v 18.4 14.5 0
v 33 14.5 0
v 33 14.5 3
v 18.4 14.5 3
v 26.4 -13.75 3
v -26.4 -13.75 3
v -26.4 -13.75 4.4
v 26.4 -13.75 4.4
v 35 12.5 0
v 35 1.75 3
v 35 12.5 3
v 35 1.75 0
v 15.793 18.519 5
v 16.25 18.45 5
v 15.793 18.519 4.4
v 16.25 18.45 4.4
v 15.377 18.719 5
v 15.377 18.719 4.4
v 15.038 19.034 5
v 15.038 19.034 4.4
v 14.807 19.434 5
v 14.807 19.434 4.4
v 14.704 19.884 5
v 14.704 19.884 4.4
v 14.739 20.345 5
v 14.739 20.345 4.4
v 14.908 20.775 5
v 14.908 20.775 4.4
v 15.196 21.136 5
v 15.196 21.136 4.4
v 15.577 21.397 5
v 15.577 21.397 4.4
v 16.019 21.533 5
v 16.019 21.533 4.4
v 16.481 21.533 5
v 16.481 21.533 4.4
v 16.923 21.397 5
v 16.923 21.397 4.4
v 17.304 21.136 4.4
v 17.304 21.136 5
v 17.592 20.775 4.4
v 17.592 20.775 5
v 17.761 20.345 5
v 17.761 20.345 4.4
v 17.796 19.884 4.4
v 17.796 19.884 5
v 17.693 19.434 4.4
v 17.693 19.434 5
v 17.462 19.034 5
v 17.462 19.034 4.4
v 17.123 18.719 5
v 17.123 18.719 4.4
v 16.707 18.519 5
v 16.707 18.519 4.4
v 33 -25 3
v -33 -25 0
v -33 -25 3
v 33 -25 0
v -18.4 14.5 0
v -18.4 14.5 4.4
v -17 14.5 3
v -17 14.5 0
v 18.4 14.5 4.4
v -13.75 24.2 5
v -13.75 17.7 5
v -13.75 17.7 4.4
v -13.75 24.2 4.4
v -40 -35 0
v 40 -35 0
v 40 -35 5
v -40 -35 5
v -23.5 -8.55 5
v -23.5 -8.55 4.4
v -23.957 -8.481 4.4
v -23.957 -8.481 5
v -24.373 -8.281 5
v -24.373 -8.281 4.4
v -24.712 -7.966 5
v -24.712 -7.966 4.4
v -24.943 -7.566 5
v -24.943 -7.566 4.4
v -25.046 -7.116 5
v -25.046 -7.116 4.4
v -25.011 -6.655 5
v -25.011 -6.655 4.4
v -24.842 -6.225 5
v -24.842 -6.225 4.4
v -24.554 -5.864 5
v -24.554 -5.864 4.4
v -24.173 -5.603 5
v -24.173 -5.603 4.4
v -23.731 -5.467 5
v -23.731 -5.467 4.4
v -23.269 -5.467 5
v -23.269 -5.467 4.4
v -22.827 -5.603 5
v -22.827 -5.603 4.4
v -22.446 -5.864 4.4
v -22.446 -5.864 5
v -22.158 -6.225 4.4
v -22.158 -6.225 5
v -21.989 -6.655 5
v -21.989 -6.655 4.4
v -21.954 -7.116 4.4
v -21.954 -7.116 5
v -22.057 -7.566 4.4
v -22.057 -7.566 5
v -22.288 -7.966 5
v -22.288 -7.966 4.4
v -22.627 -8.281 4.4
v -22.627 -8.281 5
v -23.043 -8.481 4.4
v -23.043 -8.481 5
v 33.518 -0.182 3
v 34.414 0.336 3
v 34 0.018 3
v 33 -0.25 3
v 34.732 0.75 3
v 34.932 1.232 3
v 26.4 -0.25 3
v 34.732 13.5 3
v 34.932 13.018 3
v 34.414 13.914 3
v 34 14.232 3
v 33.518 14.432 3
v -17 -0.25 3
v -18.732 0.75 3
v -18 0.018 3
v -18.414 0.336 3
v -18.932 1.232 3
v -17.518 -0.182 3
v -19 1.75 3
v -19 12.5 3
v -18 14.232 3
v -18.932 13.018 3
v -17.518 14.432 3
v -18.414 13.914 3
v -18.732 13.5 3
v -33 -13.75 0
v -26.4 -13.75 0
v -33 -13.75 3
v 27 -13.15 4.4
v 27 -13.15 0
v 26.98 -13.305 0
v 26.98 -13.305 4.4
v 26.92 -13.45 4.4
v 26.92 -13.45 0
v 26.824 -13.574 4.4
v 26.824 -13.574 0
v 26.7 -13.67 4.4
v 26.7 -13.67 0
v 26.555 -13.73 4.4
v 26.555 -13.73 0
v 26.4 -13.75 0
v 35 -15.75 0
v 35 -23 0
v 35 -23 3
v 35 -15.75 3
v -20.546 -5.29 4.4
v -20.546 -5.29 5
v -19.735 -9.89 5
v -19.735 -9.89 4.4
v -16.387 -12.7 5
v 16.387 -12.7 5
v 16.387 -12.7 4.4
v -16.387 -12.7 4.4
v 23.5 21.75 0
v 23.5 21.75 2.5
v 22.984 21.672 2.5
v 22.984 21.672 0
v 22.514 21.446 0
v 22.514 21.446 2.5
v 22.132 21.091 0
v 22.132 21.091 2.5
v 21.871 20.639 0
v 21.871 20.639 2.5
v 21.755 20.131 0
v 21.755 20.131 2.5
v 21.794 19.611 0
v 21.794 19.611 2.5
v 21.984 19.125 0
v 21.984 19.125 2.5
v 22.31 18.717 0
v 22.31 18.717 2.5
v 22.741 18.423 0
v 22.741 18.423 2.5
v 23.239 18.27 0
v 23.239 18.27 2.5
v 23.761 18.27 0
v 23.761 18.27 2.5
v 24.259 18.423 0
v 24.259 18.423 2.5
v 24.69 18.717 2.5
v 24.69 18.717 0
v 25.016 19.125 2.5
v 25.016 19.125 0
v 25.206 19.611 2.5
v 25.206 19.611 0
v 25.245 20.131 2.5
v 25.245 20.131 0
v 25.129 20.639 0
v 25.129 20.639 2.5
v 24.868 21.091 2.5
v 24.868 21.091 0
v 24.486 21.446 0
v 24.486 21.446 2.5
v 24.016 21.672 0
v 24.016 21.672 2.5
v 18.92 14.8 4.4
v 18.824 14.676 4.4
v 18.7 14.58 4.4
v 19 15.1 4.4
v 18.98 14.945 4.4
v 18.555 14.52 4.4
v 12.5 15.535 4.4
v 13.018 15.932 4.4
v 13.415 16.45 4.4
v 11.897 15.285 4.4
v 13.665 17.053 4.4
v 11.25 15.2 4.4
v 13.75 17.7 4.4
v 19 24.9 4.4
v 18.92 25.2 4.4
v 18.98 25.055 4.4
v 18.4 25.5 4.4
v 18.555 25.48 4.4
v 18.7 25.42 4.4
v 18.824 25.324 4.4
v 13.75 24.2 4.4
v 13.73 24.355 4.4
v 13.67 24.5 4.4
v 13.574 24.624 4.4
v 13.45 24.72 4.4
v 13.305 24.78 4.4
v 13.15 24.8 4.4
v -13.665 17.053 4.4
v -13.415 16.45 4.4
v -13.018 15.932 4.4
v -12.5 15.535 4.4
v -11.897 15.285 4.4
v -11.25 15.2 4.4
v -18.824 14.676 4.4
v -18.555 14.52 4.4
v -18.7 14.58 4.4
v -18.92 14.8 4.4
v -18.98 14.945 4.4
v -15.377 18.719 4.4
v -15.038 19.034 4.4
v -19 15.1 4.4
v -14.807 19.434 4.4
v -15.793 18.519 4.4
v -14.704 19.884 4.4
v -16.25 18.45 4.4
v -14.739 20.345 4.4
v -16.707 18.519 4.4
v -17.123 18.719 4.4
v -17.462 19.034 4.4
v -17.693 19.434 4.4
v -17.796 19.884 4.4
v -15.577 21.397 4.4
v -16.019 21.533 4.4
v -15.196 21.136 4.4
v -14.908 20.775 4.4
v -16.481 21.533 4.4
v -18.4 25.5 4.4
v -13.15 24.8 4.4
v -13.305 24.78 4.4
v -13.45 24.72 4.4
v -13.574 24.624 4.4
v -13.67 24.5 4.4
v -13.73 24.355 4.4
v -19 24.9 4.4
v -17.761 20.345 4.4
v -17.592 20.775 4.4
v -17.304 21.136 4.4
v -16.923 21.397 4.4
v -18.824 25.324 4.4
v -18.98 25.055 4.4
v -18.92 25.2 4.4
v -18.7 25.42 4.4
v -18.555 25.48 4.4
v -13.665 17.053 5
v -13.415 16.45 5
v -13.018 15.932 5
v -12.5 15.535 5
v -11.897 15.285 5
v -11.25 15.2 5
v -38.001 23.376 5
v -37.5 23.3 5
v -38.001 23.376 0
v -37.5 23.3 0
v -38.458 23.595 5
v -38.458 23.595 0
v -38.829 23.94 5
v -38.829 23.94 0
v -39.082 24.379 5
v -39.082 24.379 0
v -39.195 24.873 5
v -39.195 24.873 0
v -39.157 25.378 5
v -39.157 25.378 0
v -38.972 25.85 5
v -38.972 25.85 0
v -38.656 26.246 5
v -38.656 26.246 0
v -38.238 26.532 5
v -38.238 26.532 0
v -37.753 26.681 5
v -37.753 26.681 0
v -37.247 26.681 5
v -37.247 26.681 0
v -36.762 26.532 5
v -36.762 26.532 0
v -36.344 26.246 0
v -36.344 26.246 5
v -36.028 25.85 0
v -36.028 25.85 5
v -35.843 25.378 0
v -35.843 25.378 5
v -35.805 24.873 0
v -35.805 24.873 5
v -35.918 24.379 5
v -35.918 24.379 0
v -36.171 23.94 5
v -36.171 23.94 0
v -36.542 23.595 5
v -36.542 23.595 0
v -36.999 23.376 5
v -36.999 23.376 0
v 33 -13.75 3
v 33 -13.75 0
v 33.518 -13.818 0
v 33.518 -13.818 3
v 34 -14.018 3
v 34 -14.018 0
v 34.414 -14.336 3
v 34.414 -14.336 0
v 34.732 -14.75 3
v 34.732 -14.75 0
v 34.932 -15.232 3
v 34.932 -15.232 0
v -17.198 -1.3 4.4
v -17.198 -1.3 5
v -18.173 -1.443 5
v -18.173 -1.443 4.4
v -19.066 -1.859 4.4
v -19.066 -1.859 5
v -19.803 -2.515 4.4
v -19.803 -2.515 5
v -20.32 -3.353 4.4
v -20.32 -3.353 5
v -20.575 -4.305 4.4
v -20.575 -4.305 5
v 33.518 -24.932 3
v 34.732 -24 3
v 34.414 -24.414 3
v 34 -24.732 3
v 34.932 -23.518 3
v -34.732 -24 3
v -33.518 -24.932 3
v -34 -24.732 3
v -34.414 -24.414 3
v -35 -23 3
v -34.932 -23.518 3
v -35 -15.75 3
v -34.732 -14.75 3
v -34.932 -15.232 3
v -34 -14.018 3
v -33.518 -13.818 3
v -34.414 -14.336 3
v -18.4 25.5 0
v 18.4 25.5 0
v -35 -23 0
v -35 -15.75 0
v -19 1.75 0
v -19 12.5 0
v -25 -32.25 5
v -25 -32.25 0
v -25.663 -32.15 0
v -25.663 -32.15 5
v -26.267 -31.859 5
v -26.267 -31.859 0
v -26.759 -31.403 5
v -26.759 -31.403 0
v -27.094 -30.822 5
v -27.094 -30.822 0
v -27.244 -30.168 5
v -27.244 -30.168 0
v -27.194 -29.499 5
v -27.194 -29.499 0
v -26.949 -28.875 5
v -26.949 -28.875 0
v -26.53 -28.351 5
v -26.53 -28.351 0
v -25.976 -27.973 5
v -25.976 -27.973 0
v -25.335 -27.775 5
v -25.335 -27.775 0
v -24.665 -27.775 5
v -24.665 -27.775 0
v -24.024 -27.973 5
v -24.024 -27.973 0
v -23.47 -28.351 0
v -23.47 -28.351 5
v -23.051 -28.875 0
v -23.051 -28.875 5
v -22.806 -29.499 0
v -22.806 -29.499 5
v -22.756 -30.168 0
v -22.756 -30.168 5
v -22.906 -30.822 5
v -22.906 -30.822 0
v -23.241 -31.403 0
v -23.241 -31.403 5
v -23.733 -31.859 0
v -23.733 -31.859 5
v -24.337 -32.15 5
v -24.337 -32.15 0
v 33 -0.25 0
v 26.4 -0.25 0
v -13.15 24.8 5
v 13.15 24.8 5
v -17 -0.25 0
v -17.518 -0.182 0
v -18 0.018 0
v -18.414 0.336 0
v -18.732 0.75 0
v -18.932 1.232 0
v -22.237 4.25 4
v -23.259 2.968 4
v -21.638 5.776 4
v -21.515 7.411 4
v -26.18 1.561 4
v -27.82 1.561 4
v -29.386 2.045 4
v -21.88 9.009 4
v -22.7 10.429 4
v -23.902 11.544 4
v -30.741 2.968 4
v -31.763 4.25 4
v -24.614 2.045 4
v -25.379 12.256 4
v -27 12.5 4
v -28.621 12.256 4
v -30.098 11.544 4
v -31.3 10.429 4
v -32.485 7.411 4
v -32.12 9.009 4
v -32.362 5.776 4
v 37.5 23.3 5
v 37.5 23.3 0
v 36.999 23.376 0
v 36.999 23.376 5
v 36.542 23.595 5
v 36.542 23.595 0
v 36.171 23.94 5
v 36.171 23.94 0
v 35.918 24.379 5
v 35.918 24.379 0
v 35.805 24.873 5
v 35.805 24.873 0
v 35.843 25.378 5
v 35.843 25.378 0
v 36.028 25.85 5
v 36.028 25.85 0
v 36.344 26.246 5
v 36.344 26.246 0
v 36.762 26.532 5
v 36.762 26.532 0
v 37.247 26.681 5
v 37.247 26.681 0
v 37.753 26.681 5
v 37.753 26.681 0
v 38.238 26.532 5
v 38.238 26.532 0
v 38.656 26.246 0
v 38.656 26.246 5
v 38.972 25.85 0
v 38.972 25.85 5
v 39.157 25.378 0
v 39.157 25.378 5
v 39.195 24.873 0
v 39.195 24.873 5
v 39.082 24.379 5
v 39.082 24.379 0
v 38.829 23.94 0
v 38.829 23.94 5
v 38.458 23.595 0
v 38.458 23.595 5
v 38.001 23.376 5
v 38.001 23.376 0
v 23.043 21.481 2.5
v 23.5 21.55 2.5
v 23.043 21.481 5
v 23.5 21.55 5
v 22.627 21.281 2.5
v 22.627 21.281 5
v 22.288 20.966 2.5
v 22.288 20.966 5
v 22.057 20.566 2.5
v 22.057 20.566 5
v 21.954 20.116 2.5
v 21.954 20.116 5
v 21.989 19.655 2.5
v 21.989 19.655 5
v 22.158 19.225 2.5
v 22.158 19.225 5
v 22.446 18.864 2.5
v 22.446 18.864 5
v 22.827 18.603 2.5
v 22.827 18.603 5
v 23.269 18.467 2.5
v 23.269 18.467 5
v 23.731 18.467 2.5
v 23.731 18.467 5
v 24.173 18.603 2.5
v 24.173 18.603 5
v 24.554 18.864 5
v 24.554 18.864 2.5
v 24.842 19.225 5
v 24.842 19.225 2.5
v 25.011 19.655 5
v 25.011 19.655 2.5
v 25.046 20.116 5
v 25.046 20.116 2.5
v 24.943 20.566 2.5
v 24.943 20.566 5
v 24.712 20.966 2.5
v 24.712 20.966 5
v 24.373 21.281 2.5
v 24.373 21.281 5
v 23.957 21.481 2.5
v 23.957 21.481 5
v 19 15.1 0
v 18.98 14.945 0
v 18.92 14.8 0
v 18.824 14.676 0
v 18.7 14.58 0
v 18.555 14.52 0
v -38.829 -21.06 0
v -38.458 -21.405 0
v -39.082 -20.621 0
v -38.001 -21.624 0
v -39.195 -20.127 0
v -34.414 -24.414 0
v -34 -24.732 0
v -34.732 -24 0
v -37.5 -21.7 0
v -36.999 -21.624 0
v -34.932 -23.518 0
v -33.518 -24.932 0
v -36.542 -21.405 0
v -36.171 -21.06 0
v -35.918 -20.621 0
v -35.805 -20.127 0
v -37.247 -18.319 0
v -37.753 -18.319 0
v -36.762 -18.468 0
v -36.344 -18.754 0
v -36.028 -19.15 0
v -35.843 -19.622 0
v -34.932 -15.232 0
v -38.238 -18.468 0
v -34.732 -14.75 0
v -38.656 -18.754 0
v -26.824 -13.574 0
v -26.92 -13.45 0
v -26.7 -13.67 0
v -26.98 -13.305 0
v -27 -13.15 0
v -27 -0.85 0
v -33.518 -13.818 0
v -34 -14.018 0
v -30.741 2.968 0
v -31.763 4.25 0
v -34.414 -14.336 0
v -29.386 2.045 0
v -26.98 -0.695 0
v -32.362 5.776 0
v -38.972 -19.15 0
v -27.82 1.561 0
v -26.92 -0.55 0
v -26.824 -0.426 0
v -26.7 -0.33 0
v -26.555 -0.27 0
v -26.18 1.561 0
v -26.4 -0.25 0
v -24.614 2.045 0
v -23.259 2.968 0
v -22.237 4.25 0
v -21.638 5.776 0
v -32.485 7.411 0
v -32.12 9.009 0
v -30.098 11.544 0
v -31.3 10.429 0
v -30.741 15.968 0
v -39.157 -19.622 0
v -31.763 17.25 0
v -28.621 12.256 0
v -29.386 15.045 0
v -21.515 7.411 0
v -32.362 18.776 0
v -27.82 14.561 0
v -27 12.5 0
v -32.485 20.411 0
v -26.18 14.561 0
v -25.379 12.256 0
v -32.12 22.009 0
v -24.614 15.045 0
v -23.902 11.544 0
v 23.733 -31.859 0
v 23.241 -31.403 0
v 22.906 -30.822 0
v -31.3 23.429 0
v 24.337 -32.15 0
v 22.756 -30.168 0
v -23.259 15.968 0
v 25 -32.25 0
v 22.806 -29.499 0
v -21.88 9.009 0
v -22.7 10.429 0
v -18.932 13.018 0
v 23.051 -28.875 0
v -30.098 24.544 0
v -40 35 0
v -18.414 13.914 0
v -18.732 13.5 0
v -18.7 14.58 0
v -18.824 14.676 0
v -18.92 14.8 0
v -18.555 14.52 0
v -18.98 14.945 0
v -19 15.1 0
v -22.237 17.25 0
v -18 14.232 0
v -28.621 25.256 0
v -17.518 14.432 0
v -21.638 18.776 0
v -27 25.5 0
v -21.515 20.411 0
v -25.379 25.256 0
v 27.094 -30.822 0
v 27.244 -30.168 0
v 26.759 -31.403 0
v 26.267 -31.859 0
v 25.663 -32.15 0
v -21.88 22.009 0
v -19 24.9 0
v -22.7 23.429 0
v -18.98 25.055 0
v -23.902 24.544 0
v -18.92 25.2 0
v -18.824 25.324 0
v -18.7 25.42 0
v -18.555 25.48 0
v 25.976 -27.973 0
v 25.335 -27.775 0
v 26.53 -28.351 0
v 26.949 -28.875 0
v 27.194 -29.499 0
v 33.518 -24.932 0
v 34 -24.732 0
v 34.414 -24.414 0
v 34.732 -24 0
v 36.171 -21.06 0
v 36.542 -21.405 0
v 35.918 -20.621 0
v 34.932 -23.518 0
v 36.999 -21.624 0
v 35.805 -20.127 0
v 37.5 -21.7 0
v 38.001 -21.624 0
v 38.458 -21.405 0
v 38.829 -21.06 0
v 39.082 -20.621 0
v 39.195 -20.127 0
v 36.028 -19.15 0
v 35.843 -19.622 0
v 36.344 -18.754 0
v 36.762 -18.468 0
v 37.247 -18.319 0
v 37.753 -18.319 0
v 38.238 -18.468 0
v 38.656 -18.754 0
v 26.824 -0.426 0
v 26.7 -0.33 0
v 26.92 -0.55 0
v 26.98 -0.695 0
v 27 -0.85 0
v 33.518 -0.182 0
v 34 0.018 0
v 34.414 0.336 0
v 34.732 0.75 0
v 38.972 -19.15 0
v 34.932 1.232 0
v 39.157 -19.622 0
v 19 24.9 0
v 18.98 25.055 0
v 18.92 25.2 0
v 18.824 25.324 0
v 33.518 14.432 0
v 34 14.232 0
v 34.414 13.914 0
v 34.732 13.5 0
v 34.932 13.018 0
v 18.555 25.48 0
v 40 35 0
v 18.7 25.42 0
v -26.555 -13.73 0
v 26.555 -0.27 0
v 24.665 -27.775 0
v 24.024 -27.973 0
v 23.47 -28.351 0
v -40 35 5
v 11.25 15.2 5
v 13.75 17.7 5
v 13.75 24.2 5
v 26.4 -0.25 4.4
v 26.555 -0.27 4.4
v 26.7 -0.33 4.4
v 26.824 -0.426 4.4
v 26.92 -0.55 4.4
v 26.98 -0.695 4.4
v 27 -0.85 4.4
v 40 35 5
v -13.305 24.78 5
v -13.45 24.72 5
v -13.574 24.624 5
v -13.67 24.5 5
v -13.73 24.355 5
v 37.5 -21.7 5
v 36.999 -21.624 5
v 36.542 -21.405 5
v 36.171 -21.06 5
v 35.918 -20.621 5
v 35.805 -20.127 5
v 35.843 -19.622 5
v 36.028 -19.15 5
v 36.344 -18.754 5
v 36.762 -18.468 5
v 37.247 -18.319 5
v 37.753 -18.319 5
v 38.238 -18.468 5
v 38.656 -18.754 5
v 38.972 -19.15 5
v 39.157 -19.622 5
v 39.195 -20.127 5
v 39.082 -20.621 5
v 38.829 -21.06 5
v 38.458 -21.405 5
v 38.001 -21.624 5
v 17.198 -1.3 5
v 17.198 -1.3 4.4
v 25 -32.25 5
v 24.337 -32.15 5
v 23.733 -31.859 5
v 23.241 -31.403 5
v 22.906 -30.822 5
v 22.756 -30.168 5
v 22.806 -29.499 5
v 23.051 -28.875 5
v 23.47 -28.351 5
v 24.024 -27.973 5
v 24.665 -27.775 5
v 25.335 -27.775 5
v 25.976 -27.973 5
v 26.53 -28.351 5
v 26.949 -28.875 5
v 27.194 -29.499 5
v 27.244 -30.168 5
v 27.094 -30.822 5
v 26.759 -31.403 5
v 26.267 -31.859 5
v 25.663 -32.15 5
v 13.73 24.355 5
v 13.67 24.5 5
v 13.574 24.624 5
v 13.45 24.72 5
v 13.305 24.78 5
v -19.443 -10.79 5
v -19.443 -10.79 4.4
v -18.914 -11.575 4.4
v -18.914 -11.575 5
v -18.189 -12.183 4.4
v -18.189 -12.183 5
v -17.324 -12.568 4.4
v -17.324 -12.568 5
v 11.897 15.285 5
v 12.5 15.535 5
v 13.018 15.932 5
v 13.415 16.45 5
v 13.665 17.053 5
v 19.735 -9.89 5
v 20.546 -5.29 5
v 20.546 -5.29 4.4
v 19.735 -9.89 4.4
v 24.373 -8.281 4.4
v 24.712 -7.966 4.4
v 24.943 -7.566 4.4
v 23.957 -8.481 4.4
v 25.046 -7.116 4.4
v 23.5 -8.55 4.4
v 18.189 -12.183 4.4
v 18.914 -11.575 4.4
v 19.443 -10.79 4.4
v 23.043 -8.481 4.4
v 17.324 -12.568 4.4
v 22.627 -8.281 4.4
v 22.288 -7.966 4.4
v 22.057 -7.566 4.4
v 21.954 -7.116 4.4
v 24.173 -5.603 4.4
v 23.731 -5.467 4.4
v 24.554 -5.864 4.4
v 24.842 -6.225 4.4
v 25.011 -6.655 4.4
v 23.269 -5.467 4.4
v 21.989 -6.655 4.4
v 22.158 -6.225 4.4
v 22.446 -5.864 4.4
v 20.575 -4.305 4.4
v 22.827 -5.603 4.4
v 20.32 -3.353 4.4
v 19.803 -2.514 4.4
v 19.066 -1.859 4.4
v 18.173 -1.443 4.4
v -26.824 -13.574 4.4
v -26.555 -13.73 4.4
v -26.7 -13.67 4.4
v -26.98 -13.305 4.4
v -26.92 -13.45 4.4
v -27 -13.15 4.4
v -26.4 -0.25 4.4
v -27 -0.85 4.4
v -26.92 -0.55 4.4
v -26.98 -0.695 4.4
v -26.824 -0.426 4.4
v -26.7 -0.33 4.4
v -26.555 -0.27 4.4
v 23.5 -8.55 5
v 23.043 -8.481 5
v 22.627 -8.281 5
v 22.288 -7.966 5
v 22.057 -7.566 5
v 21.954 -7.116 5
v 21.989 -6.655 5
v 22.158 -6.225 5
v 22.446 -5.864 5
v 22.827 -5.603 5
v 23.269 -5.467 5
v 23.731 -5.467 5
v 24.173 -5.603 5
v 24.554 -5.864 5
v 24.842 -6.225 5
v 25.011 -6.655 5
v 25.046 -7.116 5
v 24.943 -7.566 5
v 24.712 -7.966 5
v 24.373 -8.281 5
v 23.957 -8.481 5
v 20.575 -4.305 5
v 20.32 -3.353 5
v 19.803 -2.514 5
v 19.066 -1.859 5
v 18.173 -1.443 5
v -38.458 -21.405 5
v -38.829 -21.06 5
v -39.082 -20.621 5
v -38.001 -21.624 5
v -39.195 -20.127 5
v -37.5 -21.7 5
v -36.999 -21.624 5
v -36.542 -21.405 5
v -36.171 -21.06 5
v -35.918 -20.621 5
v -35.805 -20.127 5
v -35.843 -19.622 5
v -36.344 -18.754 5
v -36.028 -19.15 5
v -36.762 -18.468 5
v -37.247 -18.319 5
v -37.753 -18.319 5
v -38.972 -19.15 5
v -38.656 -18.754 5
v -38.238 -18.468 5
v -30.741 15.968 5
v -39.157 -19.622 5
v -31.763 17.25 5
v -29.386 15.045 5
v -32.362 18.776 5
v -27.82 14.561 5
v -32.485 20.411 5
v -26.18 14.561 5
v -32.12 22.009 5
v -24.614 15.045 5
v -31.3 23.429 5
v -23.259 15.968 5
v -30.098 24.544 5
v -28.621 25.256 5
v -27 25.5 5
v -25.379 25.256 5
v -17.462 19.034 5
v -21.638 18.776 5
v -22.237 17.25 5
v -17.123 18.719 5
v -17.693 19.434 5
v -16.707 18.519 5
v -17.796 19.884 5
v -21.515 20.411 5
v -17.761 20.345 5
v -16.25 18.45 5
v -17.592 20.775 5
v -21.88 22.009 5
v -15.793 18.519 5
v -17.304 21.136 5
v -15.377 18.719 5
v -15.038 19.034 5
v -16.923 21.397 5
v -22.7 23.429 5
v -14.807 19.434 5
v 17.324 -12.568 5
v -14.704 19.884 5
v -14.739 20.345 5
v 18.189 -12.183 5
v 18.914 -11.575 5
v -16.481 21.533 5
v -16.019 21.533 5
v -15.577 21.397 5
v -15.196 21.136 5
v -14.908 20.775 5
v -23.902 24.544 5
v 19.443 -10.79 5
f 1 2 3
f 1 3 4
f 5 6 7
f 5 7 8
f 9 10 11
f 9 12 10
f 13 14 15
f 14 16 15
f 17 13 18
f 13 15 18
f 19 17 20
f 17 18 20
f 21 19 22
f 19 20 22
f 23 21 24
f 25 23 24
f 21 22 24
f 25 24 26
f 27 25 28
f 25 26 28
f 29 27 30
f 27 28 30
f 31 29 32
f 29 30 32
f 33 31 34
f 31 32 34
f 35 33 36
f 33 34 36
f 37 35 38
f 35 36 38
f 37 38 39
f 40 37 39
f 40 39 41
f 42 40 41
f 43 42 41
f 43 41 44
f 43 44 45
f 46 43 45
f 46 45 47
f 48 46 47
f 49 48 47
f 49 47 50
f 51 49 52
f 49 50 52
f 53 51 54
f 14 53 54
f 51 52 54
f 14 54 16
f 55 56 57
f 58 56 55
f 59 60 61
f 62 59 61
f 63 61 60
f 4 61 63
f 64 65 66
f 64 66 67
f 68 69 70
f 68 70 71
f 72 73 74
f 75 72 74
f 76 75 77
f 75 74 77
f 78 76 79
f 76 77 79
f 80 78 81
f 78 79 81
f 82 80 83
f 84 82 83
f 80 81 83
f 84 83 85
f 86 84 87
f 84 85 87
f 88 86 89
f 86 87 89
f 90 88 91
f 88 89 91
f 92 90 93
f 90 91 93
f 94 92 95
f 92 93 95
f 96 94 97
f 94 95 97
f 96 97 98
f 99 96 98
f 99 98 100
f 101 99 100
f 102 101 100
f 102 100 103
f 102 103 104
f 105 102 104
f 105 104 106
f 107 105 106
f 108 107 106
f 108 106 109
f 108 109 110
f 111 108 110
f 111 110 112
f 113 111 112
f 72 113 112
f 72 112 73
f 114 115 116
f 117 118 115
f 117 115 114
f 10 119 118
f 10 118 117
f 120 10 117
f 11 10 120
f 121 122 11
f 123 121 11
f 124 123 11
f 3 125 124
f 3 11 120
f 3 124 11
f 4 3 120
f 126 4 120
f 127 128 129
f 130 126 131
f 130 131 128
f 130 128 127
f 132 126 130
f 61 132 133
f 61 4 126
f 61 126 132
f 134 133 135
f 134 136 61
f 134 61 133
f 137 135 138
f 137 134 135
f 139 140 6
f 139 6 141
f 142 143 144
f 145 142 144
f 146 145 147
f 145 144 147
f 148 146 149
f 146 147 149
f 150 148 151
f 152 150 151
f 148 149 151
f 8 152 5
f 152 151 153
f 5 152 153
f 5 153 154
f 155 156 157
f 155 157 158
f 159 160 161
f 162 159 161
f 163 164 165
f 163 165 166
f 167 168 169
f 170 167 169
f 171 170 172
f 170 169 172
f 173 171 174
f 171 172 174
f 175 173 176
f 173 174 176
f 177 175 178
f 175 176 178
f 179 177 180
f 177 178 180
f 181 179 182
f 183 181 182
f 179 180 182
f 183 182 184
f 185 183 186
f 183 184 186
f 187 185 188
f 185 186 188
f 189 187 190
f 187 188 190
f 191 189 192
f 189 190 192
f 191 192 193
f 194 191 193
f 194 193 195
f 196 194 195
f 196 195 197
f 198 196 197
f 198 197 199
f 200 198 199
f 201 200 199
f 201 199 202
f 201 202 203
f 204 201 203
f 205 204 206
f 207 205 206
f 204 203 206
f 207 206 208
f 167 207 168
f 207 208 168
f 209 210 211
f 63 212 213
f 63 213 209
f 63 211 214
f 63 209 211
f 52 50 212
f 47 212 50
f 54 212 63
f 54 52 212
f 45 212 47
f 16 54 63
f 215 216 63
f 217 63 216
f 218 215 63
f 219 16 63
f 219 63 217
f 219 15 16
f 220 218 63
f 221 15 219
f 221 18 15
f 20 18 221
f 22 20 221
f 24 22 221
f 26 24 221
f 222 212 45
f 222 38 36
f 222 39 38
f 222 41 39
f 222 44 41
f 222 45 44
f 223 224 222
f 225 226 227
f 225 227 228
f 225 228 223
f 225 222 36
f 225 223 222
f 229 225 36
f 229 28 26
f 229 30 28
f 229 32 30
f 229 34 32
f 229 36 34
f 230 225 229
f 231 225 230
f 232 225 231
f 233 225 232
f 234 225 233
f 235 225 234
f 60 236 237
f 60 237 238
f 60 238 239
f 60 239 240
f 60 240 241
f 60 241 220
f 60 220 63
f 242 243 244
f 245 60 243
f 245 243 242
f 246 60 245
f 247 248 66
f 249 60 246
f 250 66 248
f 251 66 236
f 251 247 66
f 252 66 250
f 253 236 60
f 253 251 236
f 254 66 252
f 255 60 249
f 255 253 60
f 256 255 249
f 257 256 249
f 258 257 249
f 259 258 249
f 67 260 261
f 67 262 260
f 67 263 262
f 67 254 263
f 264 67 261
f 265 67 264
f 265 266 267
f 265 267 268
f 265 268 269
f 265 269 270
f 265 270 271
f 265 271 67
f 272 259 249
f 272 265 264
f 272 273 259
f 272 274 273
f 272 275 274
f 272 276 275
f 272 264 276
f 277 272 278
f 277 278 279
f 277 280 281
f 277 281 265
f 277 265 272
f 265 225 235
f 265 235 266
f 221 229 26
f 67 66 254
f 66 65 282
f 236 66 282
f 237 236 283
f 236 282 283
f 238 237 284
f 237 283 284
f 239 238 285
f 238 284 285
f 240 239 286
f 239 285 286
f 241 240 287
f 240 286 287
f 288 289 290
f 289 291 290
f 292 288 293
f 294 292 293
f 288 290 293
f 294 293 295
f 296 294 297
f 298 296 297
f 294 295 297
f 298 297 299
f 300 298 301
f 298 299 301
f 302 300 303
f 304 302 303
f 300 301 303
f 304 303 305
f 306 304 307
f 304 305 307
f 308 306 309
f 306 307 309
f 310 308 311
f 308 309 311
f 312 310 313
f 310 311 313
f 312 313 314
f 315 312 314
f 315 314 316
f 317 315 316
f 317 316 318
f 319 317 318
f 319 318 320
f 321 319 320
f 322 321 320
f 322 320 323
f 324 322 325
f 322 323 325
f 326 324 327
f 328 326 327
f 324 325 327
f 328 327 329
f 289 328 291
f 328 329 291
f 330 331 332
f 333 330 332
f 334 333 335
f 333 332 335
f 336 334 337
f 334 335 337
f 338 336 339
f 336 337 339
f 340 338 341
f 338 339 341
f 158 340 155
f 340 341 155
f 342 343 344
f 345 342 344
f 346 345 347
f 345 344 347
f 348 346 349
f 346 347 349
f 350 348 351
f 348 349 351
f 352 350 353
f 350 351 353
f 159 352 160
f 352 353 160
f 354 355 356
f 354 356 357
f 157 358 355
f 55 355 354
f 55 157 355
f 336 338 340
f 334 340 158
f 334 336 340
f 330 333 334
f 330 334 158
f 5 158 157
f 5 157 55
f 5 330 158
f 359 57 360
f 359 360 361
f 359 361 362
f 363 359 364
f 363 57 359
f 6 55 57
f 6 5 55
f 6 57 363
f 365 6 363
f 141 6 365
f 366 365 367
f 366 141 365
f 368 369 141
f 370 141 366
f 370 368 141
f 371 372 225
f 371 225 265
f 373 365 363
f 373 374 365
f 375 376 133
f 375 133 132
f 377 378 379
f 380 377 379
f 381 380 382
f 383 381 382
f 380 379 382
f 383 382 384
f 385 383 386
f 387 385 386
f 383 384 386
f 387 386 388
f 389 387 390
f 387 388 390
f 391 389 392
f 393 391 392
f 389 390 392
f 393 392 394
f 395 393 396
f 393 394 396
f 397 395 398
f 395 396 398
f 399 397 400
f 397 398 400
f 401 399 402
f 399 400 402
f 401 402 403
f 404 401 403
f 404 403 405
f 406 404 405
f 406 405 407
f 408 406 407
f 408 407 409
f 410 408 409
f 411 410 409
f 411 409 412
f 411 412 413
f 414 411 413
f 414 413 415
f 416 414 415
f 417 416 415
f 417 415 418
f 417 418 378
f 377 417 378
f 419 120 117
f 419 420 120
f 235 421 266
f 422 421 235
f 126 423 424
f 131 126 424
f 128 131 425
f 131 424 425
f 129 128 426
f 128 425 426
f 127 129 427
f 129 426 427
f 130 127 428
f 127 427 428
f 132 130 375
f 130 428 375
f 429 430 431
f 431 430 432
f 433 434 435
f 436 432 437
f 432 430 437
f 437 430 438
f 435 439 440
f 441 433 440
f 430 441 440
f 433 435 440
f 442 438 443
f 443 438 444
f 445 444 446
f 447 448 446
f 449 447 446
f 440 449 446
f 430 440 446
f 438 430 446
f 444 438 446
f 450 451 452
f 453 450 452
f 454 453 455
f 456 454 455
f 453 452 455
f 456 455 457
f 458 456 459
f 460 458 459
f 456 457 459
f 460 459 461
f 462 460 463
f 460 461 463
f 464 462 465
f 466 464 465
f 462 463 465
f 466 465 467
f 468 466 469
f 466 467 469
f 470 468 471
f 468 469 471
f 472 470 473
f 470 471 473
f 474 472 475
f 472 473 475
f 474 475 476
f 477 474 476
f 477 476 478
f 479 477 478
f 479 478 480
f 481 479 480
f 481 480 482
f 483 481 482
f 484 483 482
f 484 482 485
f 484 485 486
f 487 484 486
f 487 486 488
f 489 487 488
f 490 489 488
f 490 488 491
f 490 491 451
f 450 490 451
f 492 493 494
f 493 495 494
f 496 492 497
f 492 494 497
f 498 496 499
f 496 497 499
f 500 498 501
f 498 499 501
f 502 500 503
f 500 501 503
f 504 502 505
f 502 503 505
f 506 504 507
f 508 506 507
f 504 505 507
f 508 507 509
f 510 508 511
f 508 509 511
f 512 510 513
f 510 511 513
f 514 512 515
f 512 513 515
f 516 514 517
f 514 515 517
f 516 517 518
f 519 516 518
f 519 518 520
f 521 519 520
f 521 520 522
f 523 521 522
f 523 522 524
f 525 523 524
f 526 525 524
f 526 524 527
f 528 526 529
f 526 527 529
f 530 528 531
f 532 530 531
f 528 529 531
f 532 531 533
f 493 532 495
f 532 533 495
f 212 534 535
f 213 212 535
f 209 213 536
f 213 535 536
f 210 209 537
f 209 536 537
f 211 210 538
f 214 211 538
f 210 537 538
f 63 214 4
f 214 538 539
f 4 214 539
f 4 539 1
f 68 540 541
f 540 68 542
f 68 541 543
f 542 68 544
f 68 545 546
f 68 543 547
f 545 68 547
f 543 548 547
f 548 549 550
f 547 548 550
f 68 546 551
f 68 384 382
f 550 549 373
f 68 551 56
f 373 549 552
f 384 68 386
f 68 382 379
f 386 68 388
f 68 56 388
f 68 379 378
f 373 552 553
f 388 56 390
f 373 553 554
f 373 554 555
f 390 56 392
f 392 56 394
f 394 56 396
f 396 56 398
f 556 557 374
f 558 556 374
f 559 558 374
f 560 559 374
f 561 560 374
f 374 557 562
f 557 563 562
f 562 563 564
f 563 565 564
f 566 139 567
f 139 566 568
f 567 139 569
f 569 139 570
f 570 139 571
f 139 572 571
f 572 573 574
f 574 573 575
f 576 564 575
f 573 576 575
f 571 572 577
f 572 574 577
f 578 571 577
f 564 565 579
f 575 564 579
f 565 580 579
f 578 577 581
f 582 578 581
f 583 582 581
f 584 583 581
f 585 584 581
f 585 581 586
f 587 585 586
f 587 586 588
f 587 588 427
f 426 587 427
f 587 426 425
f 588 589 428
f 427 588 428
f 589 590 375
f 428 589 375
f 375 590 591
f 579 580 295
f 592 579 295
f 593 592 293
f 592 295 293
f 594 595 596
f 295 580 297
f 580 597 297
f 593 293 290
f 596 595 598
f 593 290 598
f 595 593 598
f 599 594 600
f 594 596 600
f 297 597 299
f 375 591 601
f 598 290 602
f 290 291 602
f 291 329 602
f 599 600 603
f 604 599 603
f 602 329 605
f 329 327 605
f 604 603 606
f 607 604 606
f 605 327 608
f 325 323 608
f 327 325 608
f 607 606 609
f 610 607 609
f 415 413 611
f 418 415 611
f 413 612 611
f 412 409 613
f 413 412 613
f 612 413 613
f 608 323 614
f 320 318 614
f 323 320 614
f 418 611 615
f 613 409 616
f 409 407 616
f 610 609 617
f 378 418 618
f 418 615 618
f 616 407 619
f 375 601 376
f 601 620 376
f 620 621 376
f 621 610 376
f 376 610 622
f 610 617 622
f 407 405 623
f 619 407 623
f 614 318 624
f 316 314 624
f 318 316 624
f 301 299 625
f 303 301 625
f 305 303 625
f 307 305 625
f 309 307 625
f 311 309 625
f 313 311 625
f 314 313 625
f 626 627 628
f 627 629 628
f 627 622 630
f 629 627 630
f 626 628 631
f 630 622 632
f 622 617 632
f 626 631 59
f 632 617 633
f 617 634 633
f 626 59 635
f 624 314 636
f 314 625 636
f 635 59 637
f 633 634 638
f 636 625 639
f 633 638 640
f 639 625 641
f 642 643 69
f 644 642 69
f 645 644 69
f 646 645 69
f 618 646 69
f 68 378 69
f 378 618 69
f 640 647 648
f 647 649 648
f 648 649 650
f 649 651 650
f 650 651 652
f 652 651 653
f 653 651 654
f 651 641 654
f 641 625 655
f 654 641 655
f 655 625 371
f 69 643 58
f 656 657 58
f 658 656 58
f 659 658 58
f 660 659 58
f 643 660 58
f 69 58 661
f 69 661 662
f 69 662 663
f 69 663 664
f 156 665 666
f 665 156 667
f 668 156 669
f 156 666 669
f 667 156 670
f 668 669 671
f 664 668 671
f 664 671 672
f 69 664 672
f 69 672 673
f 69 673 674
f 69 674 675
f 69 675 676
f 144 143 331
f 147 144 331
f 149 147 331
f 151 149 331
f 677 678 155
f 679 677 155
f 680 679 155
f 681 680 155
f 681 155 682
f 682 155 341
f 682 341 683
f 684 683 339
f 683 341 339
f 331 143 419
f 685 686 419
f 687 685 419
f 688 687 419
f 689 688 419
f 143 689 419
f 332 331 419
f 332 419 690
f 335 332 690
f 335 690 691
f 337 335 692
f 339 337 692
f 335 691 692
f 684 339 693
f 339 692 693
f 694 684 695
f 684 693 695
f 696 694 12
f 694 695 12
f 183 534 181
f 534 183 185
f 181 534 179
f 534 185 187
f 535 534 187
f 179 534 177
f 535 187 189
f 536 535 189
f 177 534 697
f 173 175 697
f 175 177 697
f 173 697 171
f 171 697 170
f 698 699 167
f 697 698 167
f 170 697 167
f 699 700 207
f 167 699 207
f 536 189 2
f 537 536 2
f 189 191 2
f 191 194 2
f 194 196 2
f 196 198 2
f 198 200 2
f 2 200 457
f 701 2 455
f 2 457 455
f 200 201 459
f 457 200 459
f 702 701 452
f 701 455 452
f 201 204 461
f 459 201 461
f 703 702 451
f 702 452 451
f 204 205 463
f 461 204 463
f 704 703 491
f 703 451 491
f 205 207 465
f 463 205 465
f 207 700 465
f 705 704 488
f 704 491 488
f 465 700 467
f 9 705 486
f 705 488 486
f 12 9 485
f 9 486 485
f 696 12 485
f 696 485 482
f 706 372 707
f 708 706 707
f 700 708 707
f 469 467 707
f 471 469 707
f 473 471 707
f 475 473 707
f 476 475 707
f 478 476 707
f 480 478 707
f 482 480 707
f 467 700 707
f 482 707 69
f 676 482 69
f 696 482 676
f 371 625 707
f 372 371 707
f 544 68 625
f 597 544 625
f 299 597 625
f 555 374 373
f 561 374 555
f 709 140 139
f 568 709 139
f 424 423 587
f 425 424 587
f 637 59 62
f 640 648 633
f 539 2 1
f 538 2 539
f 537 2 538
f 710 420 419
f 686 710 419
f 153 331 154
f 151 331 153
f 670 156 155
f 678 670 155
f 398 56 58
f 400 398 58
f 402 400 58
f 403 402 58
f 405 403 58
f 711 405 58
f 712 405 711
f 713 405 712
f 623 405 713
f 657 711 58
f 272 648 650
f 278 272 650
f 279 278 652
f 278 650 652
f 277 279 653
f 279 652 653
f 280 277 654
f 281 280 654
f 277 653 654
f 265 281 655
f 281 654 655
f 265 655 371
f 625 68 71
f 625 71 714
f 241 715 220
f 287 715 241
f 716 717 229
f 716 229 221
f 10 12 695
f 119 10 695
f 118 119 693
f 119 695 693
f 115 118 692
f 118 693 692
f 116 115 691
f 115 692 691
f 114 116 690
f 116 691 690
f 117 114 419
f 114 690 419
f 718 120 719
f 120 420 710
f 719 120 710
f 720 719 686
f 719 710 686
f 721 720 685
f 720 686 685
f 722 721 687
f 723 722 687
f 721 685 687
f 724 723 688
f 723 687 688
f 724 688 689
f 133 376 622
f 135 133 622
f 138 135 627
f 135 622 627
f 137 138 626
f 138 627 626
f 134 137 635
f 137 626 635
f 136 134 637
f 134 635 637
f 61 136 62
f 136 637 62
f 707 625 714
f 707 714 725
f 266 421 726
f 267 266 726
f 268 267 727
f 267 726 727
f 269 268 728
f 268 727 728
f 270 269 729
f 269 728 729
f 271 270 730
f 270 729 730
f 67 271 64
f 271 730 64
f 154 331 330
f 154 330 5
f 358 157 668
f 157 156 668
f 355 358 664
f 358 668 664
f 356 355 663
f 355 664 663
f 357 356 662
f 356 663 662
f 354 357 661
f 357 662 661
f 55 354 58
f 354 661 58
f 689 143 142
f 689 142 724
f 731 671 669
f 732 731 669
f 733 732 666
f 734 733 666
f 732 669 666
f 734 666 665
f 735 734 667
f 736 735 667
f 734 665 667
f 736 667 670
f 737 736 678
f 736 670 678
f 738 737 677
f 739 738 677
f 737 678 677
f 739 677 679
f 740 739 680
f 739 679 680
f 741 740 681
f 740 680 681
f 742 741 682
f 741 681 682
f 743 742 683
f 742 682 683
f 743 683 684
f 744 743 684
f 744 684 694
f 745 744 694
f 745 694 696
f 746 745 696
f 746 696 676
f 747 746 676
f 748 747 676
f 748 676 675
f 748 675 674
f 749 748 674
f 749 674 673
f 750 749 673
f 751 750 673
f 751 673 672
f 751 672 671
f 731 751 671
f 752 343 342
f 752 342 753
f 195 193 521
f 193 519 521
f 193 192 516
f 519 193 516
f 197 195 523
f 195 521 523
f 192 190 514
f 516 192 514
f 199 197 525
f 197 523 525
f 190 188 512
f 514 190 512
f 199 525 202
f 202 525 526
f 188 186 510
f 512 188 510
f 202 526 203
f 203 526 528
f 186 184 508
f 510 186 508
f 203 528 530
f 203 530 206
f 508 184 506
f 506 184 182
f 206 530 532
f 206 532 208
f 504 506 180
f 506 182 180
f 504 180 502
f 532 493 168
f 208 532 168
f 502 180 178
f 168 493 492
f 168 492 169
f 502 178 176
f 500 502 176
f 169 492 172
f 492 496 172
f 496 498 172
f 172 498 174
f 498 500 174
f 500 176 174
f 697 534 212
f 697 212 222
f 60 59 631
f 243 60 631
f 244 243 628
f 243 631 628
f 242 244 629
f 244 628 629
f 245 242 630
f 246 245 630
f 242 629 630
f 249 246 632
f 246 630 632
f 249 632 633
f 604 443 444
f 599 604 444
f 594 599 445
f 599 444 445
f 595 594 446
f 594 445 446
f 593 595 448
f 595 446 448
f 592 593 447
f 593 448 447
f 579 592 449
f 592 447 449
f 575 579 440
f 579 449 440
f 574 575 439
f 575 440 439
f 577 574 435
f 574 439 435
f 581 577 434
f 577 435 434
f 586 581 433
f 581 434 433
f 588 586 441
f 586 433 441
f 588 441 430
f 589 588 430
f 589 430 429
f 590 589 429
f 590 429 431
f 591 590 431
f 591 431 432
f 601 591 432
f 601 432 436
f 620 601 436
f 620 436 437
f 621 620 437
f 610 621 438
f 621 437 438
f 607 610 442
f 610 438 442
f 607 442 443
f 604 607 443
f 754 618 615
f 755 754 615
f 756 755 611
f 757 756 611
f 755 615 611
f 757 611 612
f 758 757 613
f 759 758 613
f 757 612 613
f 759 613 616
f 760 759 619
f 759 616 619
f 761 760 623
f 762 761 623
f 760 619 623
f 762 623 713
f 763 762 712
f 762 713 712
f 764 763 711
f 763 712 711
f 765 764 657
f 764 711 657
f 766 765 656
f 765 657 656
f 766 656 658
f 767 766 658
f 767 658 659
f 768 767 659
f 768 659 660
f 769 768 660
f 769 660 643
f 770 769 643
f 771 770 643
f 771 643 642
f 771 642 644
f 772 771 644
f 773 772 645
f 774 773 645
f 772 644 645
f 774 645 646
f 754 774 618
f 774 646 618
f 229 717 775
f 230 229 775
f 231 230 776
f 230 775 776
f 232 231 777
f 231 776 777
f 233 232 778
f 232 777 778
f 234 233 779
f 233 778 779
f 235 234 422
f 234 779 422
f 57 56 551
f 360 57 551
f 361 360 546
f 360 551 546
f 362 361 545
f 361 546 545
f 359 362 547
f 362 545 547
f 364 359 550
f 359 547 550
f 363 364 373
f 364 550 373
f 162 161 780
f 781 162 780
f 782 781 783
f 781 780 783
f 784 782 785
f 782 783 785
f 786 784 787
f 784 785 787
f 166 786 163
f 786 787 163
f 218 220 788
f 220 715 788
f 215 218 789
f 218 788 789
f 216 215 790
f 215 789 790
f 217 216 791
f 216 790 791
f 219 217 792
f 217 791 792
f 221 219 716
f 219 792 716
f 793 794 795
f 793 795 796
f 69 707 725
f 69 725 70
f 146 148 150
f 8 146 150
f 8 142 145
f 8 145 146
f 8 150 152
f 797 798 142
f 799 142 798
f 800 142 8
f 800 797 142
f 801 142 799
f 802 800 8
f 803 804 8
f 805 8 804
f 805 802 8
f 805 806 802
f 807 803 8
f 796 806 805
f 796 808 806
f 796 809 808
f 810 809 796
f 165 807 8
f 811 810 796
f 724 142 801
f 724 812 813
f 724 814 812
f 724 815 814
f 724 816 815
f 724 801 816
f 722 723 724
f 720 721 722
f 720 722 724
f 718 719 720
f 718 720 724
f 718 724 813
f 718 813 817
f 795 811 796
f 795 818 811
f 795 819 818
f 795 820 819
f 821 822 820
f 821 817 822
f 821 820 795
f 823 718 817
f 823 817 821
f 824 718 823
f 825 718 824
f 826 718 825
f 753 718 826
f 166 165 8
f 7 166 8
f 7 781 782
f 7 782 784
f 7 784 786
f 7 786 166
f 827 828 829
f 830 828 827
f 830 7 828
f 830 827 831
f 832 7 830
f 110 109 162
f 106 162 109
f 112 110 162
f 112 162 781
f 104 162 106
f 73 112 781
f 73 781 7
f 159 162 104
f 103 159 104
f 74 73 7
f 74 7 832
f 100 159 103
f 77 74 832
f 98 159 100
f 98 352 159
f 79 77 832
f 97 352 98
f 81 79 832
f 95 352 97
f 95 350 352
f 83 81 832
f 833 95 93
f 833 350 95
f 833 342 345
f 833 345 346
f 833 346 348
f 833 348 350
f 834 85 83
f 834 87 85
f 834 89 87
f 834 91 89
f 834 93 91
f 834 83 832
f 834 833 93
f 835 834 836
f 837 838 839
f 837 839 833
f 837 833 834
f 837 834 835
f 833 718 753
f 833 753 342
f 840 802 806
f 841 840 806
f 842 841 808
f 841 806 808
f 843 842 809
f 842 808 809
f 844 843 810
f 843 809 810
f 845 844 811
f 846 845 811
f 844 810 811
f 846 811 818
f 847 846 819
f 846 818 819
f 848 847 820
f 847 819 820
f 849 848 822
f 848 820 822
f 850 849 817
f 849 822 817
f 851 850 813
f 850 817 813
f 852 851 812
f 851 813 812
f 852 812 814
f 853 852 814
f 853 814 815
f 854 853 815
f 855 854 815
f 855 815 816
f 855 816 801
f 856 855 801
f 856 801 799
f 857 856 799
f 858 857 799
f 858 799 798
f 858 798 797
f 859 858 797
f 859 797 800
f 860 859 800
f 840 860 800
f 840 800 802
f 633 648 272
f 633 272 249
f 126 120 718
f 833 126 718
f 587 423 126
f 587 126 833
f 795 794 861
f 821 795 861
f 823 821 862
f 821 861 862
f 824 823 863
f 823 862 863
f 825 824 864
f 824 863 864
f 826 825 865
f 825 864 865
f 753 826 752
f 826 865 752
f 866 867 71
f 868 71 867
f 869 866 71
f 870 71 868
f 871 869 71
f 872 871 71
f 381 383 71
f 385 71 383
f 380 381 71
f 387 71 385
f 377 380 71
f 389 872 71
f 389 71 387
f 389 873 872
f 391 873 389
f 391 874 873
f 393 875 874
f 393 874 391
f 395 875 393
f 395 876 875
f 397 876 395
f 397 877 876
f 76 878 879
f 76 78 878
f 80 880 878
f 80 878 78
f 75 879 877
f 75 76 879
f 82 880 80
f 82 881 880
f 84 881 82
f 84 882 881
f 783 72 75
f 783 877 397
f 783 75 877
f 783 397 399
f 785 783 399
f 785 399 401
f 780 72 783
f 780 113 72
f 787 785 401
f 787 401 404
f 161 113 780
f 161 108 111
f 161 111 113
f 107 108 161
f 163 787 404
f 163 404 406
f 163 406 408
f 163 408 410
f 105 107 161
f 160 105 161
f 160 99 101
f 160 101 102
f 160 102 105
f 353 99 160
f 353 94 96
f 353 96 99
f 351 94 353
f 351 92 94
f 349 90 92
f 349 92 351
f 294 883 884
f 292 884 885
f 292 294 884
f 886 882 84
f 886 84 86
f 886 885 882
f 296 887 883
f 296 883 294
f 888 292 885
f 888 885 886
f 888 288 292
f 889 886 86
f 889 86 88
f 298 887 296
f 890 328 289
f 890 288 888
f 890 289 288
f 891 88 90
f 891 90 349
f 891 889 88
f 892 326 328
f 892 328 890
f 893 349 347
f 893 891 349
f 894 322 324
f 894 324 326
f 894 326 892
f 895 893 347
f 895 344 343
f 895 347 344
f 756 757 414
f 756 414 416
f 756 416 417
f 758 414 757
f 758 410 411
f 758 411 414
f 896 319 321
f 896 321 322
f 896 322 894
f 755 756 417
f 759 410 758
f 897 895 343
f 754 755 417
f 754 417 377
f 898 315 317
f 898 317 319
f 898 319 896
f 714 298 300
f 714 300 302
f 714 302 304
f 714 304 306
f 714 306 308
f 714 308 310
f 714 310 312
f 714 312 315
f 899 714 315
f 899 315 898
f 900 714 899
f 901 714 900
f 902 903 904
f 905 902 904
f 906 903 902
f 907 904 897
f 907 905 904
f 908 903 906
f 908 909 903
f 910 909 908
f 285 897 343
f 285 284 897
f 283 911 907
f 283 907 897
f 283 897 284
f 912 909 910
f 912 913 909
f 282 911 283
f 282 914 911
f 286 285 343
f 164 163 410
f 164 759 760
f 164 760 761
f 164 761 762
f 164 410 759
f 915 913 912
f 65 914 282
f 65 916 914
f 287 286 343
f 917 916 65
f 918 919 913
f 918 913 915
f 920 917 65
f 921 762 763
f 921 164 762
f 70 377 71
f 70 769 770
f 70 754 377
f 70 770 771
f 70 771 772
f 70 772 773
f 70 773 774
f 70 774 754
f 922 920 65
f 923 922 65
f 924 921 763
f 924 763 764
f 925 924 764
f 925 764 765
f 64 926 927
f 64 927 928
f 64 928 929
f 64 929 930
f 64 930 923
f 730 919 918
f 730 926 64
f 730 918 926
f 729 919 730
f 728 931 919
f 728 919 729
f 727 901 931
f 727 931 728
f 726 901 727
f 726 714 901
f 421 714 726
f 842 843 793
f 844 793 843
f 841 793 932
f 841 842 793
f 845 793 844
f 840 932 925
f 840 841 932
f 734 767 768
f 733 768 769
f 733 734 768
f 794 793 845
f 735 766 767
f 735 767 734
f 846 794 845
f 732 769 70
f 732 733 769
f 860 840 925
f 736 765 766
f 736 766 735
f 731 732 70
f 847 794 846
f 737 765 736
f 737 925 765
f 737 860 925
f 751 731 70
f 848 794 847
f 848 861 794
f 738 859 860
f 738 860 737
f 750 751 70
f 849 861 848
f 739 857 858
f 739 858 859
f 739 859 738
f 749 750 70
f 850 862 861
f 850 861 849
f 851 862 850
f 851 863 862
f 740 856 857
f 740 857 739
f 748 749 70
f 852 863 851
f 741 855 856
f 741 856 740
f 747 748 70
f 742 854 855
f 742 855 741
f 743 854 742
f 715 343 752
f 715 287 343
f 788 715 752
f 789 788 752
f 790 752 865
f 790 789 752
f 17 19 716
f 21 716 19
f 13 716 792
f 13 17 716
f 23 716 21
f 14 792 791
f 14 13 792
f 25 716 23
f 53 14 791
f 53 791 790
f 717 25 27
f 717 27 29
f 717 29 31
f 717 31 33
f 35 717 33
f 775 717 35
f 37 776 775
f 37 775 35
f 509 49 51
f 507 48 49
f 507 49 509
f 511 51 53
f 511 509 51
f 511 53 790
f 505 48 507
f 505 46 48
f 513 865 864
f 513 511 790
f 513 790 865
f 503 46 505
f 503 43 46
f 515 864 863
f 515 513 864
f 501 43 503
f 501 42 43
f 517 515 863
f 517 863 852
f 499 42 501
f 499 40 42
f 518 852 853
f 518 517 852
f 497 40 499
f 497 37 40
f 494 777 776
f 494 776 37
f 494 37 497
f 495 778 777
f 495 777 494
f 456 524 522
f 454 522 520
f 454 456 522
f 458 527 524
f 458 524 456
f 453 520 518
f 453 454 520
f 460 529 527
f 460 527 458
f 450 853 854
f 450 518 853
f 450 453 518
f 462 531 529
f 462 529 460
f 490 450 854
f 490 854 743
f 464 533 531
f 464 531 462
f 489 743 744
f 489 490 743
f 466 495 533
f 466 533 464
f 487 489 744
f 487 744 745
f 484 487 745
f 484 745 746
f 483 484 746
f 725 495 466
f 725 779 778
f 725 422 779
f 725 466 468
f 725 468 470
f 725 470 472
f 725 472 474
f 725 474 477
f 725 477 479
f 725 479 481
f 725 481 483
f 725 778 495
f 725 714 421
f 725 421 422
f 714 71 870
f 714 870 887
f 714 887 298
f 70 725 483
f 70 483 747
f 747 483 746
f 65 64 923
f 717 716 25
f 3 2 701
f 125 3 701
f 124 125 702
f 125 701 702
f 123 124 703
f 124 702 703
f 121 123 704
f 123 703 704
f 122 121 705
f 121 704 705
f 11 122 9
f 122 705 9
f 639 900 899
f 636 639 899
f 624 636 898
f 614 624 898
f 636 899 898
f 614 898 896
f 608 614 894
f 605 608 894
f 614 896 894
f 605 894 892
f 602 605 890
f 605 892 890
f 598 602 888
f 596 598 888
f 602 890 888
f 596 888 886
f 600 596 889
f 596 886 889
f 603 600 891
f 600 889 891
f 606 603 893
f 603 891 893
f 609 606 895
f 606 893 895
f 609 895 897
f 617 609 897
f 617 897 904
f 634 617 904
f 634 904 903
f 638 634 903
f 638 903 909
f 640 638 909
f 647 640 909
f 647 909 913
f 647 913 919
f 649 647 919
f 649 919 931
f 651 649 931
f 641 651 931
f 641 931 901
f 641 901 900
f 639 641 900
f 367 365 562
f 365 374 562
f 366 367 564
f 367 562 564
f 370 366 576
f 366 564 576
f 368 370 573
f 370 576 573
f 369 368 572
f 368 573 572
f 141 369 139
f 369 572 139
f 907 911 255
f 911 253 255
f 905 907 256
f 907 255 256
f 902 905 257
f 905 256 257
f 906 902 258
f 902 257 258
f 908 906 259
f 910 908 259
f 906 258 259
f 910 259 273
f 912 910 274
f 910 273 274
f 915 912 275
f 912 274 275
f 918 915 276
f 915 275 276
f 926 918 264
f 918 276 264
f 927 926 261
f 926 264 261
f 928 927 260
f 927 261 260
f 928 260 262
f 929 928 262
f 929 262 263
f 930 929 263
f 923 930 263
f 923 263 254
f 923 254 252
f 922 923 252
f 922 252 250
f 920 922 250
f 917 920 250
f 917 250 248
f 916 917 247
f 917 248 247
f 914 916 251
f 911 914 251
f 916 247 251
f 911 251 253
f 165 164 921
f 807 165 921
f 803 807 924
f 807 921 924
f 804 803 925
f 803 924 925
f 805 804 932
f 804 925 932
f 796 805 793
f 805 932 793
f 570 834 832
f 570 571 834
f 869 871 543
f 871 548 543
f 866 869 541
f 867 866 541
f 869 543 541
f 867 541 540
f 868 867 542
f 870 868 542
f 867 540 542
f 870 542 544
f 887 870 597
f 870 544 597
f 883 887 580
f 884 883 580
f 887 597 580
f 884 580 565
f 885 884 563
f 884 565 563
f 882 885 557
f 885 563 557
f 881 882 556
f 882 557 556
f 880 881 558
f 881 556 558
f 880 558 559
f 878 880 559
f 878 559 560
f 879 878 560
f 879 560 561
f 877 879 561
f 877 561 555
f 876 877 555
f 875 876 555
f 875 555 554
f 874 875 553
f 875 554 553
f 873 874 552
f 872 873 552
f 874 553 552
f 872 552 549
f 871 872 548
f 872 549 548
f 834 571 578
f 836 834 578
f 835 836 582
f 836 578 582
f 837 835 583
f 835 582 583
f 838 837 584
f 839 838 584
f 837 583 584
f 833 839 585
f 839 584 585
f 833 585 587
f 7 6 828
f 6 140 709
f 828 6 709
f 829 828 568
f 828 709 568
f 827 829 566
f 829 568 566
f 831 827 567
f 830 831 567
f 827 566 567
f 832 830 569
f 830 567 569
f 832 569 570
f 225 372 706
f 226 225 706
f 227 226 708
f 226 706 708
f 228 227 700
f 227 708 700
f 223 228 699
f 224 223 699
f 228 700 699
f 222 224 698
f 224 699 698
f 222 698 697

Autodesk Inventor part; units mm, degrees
ref_plane "YZ Plane" through (0, 0, 0) normal (1, 0, 0) x (0, 1, 0)
ref_plane "XZ Plane" through (0, 0, 0) normal (0, 1, 0) x (-1, 0, 0)
ref_plane "XY Plane" through (0, 0, 0) normal (0, 0, 1) x (1, 0, 0)
sketch "Skizze1" plane through (0, 0, 0) normal (0, 0, 1) x (1, 0, 0)
  line L0 (-40, 35) -> (40, 35)
  line L1 (40, 35) -> (40, -35)
  line L2 (40, -35) -> (-40, -35)
  line L3 (-40, -35) -> (-40, 35)
  line L4 (-40, 35) -> (40, -35) construction
  line L5 (40, 35) -> (-40, -35) construction
  point P0 (0, 0)
  dimension "d0" = 80
  dimension "d1" = 70
extrude "Extrusion1" add sketch "Skizze1" along normal blind 5
sketch "Skizze2" plane through (0, 0, 5) normal (0, 0, 1) x (1, 0, 0)
  line L0 (-37.5, 25) -> (37.5, 25)
  line L1 (37.5, 25) -> (37.5, -20)
  line L2 (37.5, -20) -> (-37.5, -20)
  line L3 (-37.5, -20) -> (-37.5, 25)
  line L4 (-40, 35) -> (-40, -35)
  line L5 (40, -35) -> (40, 35)
  line L6 (-40, -35) -> (40, -35)
  point P0 (0, 0)
  dimension "d4" = 2.5
  dimension "d5" = 2.5
  dimension "d6" = 15
  dimension "d7" = 60
hole "Bohrung1" at (-37.5, 25, 5) at (37.5, 25, 5) at (37.5, -20, 5) at (-37.5, -20, 5) direction (0, 0, -1) diameter 3.4 end through all
sketch "Skizze3" plane through (0, 0, 5) normal (0, 0, 1) x (1, 0, 0)
  line L0 (-25, -30) -> (25, -30)
  line L1 (-40, 35) -> (-40, -35)
  line L2 (40, -35) -> (40, 35)
  line L3 (-40, -35) -> (40, -35)
  point P0 (0, 0)
  dimension "d15" = 15
  dimension "d16" = 15
  dimension "d17" = 5
hole "Bohrung2" at (-25, -30, 5) at (25, -30, 5) direction (0, 0, -1) diameter 4.5 end through all
sketch "Skizze4" plane through (0, 0, 5) normal (0, 0, 1) x (1, 0, 0)
  line L0 (-13.15, 24.8) -> (13.15, 24.8)
  line L1 (13.75, 24.2) -> (13.75, 17.7)
  line L2 (11.25, 15.2) -> (-11.25, 15.2)
  line L3 (-13.75, 17.7) -> (-13.75, 24.2)
  line L4 (-13.75, 24.8) -> (13.75, 15.2) construction
  line L5 (13.75, 24.8) -> (-13.75, 15.2) construction
  line L6 (40, 35) -> (-40, 35)
  arc A0 (-13.15, 24.8) -> (-13.75, 24.2) centre (-13.15, 24.2) ccw
  arc A1 (13.75, 24.2) -> (13.15, 24.8) centre (13.15, 24.2) ccw
  arc A2 (-13.75, 17.7) -> (-11.25, 15.2) centre (-11.25, 17.7) ccw
  arc A3 (11.25, 15.2) -> (13.75, 17.7) centre (11.25, 17.7) ccw
  line L7 (48.751, 18.7264) -> (89.4803, 18.7264) construction
  line L8 (89.4803, 18.7264) -> (89.4803, 14.9967) construction
  line L9 (89.4803, 14.9967) -> (48.751, 14.9967) construction
  line L10 (48.751, 14.9967) -> (48.751, 18.7264) construction
  line L11 (-17.198, -1.3) -> (17.198, -1.3)
  line L12 (21.25, -1.3) -> (21.25, -1.3)
  line L13 (16.3869, -12.7) -> (-16.3869, -12.7)
  line L14 (-21.25, -1.3) -> (-21.25, -1.3)
  line L15 (-21.25, -1.3) -> (21.25, -12.7) construction
  line L16 (21.25, -1.3) -> (-21.25, -12.7) construction
  line L17 (-40, -35) -> (40, -35)
  line L18 (-20.5464, -5.2904) -> (-19.7353, -9.8904)
  line L19 (20.5464, -5.2904) -> (19.7353, -9.8904)
  arc A4 (-17.198, -1.3) -> (-20.5464, -5.2904) centre (-17.198, -4.7) ccw
  arc A5 (20.5464, -5.2904) -> (17.198, -1.3) centre (17.198, -4.7) ccw
  arc A6 (-19.7353, -9.8904) -> (-16.3869, -12.7) centre (-16.3869, -9.3) ccw
  arc A7 (16.3869, -12.7) -> (19.7353, -9.8904) centre (16.3869, -9.3) ccw
  line L20 (50.079, -7.9738) -> (119.9486, -7.9738) construction
  line L21 (119.9486, -7.9738) -> (119.9486, -12.597) construction
  line L22 (119.9486, -12.597) -> (50.079, -12.597) construction
  line L23 (50.079, -12.597) -> (50.079, -7.9738) construction
  line L24 (40, -35) -> (40, 35)
  point P0 (0, 0)
  point P1 (0, 20)
  point P2 (0, 20)
  point P3 (0, -7)
  point P4 (0, -7)
  point P5 (0, -7)
  point P6 (-19.2399, -12.7)
  point P7 (19.2399, -12.7)
  dimension "d25" = 27.5
  dimension "d26" = 9.6
  dimension "d28" = 0.6
  dimension "d29" = 2.5
  dimension "d32" = 15
  dimension "d49" = 28
  dimension "d50" = 11.4
  dimension "d51" = 42.5
  dimension "d52" = 80
  dimension "d53" = 19.2399
  dimension "d54" = 19.2399
  dimension "d55" = 80
  dimension "d56" = 3.4
  dimension "d64" = 26.25
extrude "Extrusion2" cut sketch "Skizze4" against normal through all
sketch "Skizze5" plane through (0, 0, 5) normal (0, 0, 1) x (1, 0, 0)
  line L0 (40, 35) -> (-40, 35)
  line L1 (0, -7) -> (23.5, -7)
  line L2 (0, -7) -> (-23.5, -7)
  line L3 (-40, -35) -> (40, -35)
  line L4 (-13.75, 17.7) -> (-13.75, 24.2)
  line L5 (13.75, 24.2) -> (13.75, 17.7)
  point P0 (0, 0)
  point P1 (-16.25, 20)
  point P2 (16.25, 20)
  dimension "d57" = 28
  dimension "d58" = 23.5
  dimension "d59" = 23.5
  dimension "d65" = 15
  dimension "d66" = 2.5
  dimension "d67" = 2.5
hole "Bohrung3" at (-23.5, -7, 5) at (23.5, -7, 5) at (-16.25, 20, 5) at (16.25, 20, 5) direction (0, 0, -1) diameter 3.1 end through all
sketch "Skizze6" plane through (0, 0, 0) normal (0, 0, -1) x (-1, 0, 0)
  line L0 (40, 35) -> (-40, 35)
  line L1 (-26.4, -0.25) -> (26.4, -0.25)
  line L2 (27, -0.85) -> (27, -13.15)
  line L3 (26.4, -13.75) -> (-26.4, -13.75)
  line L4 (-27, -13.15) -> (-27, -0.85)
  line L5 (-27, -0.25) -> (27, -13.75) construction
  line L6 (27, -0.25) -> (-27, -13.75) construction
  line L7 (-40, -35) -> (40, -35)
  arc A0 (-26.4, -0.25) -> (-27, -0.85) centre (-26.4, -0.85) ccw
  arc A1 (27, -0.85) -> (26.4, -0.25) centre (26.4, -0.85) ccw
  arc A2 (26.4, -13.75) -> (27, -13.15) centre (26.4, -13.15) ccw
  arc A3 (-27, -13.15) -> (-26.4, -13.75) centre (-26.4, -13.15) ccw
  circle A4 centre (-16.25, 20) radius 1.55
  line L8 (-16.25, 20) -> (16.6724, 20)
  line L9 (13.15, 24.8) -> (-13.15, 24.8)
  line L10 (0, 24.8) -> (0, 15.2)
  line L11 (11.25, 15.2) -> (-11.25, 15.2)
  line L12 (-18.4, 25.5) -> (18.4, 25.5)
  line L13 (19, 24.9) -> (19, 15.1)
  line L14 (18.4, 14.5) -> (-18.4, 14.5)
  line L15 (-19, 15.1) -> (-19, 24.9)
  line L16 (-19, 25.5) -> (19, 14.5) construction
  line L17 (19, 25.5) -> (-19, 14.5) construction
  arc A5 (-18.4, 25.5) -> (-19, 24.9) centre (-18.4, 24.9) ccw
  arc A6 (19, 24.9) -> (18.4, 25.5) centre (18.4, 24.9) ccw
  arc A7 (18.4, 14.5) -> (19, 15.1) centre (18.4, 15.1) ccw
  arc A8 (-19, 15.1) -> (-18.4, 14.5) centre (-18.4, 15.1) ccw
  point P0 (0, 0)
  point P1 (0, -7)
  point P2 (0, -7)
  point P3 (0, 20)
  dimension "d60" = 28
  dimension "d61" = 13.5
  dimension "d62" = 54
  dimension "d63" = 0.6
  dimension "d68" = 11
  dimension "d69" = 38
  dimension "d70" = 0.6
extrude "Extrusion3" cut sketch "Skizze6" against normal blind 4.4
sketch "Skizze7" plane through (0, 0, 0) normal (0, 0, -1) x (-1, 0, 0)
  line L0 (40, -35) -> (40, 35)
  line L1 (40, 35) -> (-40, 35)
  point P0 (0, 0)
  point P1 (27, 20)
hole "Bohrung4" at (-27, 20, 0) direction (0, 0, 1) diameter 11 end through all
sketch "Skizze10" plane through (0, 0, 0) normal (0, 0, -1) x (-1, 0, 0)
  line L0 (40, 35) -> (-40, 35)
  point P0 (0, 0)
  point P1 (-23.5, 20)
  dimension "d84" = 15
  dimension "d85" = 23.5
hole "Bohrung5" at (23.5, 20, 0) direction (0, 0, 1) diameter 3.1 end through all counterbore diameter 3.5 counterbore depth 2.5
sketch "Skizze11" plane through (0, 0, 0) normal (0, 0, -1) x (-1, 0, 0)
  line L0 (40, -35) -> (40, 35)
  line L1 (40, 35) -> (-40, 35)
  point P0 (0, 0)
  point P1 (27, 7)
  dimension "d93" = 13
  dimension "d94" = 28
hole "Bohrung6" at (-27, 7, 0) direction (0, 0, 1) diameter 11 depth 4
sketch "Skizze12" plane through (0, 0, 0) normal (0, 0, -1) x (-1, 0, 0)
  arc A0 (-27, -13.15) -> (-26.4, -13.75) centre (-26.4, -13.15) ccw
  line L0 (-40, -35) -> (40, -35)
  line L1 (-33, 14.5) -> (17, 14.5)
  line L2 (19, 12.5) -> (19, 1.75)
  line L3 (17, -0.25) -> (-33, -0.25)
  line L4 (-35, 1.75) -> (-35, 12.5)
  arc A1 (-35, 1.75) -> (-33, -0.25) centre (-33, 1.75) ccw
  arc A2 (17, -0.25) -> (19, 1.75) centre (17, 1.75) ccw
  arc A3 (-33, 14.5) -> (-35, 12.5) centre (-33, 12.5) ccw
  circle A4 centre (-16.25, 20) radius 1.55
  line L5 (-40, 35) -> (-40, -35)
  line L6 (-33, -13.75) -> (33, -13.75)
  line L7 (35, -15.75) -> (35, -23)
  line L8 (33, -25) -> (-33, -25)
  line L9 (-35, -23) -> (-35, -15.75)
  arc A5 (-33, -13.75) -> (-35, -15.75) centre (-33, -15.75) ccw
  arc A6 (-35, -23) -> (-33, -25) centre (-33, -23) ccw
  arc A7 (33, -25) -> (35, -23) centre (33, -23) ccw
  arc A8 (35, -15.75) -> (33, -13.75) centre (33, -15.75) ccw
  line L10 (40, -35) -> (40, 35)
  arc A9 (19, 12.5) -> (17, 14.5) centre (17, 12.5) ccw
  point P0 (0, 0)
  point P1 (27, -13.15)
  point P2 (19, 14.5)
  point P3 (-27, -0.85)
  point P4 (13.75, 17.7)
  point P5 (-11.25, 15.2)
  point P6 (19, 15.1)
  point P7 (-26.4, -0.25)
  point P8 (18.4, 14.5)
  dimension "d106" = 2
  dimension "d107" = 2
  dimension "d111" = 5
  dimension "d112" = 2
  dimension "d113" = 10
  dimension "d114" = 5
  dimension "d115" = 2
extrude "Extrusion4" cut sketch "Skizze12" against normal blind 3 contours L1 A9 L2 A2 L3 A1 L4 A3 | L6 A8 L7 A7 L8 A6 L9 A5
properties part number "Rückwand_DVI"
